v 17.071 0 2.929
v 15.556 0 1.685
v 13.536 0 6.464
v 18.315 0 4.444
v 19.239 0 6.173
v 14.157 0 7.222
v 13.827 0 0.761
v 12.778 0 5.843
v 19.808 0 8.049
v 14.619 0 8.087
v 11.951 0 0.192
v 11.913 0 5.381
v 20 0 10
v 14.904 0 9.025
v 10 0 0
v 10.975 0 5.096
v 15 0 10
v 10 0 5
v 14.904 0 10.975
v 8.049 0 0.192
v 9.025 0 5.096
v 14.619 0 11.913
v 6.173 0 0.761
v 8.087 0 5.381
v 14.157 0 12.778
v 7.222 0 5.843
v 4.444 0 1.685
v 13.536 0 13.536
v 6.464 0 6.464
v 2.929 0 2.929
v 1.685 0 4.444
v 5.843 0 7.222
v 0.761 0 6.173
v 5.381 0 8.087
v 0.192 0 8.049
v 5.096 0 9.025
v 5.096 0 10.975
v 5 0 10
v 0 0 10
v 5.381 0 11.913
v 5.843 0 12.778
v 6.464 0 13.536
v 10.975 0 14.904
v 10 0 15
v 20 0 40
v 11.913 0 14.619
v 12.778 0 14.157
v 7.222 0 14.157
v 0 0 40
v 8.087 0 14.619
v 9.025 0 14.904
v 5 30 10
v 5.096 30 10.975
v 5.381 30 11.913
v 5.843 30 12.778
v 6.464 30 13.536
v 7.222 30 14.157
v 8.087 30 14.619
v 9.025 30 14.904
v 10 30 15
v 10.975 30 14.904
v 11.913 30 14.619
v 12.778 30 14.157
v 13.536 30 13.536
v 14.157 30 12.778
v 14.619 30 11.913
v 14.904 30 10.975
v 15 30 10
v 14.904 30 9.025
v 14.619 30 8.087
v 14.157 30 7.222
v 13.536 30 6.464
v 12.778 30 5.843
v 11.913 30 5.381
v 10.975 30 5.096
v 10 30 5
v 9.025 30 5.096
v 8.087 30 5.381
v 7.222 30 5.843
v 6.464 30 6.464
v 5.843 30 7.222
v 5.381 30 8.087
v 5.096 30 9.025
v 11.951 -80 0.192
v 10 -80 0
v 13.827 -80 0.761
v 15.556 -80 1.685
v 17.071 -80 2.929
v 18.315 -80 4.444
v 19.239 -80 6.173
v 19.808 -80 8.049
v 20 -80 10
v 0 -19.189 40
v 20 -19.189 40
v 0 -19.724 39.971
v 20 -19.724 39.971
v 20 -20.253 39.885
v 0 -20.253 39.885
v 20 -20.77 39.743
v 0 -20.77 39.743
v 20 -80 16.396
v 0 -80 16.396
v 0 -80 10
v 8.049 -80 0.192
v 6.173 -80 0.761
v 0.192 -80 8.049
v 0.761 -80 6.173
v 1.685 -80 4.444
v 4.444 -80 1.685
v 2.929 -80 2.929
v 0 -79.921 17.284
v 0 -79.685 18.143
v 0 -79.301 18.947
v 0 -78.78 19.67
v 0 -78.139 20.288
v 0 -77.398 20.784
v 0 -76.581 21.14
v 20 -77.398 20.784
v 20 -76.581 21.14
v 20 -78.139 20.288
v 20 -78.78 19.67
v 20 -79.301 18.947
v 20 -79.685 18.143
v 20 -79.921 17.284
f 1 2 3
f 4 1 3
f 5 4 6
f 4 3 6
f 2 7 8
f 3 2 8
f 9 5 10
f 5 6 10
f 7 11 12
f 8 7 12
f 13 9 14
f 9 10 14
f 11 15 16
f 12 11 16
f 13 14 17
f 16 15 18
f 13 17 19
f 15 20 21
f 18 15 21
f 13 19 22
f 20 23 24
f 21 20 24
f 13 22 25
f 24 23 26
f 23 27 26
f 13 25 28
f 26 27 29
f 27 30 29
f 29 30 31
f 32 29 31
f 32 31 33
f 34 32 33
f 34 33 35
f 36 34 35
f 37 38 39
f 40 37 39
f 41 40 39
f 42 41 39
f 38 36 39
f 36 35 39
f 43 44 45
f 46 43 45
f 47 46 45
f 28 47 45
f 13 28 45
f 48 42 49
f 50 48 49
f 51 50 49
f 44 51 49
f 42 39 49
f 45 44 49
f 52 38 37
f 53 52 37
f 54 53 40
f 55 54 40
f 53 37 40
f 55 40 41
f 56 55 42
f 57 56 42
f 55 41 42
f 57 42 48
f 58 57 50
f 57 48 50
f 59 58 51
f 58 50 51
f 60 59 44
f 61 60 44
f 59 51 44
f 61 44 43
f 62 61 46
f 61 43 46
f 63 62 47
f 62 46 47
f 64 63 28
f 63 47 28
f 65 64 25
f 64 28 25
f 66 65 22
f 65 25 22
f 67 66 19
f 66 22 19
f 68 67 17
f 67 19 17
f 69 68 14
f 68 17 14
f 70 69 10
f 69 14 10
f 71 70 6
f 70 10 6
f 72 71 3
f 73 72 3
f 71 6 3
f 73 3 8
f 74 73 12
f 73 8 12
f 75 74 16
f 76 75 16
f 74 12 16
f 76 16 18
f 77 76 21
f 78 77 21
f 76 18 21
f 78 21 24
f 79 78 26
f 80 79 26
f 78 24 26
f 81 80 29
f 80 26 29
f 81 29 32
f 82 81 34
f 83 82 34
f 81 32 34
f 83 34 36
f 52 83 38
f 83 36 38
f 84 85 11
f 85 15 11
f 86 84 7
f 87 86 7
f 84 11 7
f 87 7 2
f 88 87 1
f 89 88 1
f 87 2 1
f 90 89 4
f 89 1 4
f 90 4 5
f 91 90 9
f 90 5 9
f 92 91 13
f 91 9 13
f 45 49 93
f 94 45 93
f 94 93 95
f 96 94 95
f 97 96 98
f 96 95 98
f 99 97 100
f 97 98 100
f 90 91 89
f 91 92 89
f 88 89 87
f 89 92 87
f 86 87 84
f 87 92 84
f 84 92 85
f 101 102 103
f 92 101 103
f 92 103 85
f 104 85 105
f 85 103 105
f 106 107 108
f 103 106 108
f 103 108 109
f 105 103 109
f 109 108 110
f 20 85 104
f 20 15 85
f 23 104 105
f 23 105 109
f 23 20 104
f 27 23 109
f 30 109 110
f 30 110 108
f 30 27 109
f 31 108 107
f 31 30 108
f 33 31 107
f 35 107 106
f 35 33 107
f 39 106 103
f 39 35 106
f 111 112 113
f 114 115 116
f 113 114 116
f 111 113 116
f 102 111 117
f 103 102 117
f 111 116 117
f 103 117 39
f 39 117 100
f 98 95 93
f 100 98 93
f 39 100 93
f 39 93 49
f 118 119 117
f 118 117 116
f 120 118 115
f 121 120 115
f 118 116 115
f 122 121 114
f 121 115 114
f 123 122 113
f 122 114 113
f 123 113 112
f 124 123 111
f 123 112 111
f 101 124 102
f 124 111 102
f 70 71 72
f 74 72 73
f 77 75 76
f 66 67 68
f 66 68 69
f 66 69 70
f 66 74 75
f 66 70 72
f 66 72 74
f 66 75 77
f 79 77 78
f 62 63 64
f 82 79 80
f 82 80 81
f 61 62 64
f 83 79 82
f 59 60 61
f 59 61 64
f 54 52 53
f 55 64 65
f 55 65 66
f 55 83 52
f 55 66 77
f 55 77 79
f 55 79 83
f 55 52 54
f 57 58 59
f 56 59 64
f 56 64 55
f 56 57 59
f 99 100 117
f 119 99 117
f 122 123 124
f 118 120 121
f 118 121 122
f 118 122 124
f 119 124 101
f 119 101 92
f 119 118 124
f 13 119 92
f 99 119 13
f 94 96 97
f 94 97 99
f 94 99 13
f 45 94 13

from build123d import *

# Parameters (mm, degrees)
F1_DEPTH = 20
F2_R     = 9.99999
F3_R     = 5
F4_DEPTH = 30


# Not quite as in the source:
# - a fillet or chamfer is up to 0.001 mm smaller than in the source, because OpenCascade refuses the exact size


with BuildPart() as f1:
    # F0 (on Right) → F1 (new body)
    with BuildSketch(Plane.YZ):
        with BuildLine():
            Line((-80, 0), (0, 0))
            Line((0, 0), (0, 40))
            Line((0, 40), (-19.1886116992, 40))
            ThreePointArc((-19.1886116992, 40), (-19.9895229142, 39.9354372882), (-20.7697505292, 39.7434164903))
            Line((-20.7697505292, 39.7434164903), (-76.5811388301, 21.13962039))
            ThreePointArc((-76.5811388301, 21.13962039), (-79.0562109259, 19.319755323), (-80, 16.3962038997))
            Line((-80, 16.3962038997), (-80, 0))
        make_face()
    extrude(amount=F1_DEPTH)

    # F2 (radius 10 in the source; OpenCascade refuses exactly that, so slightly less here)
    f2_edges = [f1.edges().sort_by_distance(p)[0] for p in [
        (20, -40, 0),
        (0, -40, 0),
    ]]
    fillet(f2_edges, radius=F2_R)

    # F3 (on face) → F4 (join)
    with BuildSketch(Plane(origin=(0, 0, 0), x_dir=(-1, 0, 0), z_dir=(0, 1, 0))):
        with Locations((-10, 10)):
            Circle(F3_R)
    extrude(amount=F4_DEPTH)


solid = f1.part
